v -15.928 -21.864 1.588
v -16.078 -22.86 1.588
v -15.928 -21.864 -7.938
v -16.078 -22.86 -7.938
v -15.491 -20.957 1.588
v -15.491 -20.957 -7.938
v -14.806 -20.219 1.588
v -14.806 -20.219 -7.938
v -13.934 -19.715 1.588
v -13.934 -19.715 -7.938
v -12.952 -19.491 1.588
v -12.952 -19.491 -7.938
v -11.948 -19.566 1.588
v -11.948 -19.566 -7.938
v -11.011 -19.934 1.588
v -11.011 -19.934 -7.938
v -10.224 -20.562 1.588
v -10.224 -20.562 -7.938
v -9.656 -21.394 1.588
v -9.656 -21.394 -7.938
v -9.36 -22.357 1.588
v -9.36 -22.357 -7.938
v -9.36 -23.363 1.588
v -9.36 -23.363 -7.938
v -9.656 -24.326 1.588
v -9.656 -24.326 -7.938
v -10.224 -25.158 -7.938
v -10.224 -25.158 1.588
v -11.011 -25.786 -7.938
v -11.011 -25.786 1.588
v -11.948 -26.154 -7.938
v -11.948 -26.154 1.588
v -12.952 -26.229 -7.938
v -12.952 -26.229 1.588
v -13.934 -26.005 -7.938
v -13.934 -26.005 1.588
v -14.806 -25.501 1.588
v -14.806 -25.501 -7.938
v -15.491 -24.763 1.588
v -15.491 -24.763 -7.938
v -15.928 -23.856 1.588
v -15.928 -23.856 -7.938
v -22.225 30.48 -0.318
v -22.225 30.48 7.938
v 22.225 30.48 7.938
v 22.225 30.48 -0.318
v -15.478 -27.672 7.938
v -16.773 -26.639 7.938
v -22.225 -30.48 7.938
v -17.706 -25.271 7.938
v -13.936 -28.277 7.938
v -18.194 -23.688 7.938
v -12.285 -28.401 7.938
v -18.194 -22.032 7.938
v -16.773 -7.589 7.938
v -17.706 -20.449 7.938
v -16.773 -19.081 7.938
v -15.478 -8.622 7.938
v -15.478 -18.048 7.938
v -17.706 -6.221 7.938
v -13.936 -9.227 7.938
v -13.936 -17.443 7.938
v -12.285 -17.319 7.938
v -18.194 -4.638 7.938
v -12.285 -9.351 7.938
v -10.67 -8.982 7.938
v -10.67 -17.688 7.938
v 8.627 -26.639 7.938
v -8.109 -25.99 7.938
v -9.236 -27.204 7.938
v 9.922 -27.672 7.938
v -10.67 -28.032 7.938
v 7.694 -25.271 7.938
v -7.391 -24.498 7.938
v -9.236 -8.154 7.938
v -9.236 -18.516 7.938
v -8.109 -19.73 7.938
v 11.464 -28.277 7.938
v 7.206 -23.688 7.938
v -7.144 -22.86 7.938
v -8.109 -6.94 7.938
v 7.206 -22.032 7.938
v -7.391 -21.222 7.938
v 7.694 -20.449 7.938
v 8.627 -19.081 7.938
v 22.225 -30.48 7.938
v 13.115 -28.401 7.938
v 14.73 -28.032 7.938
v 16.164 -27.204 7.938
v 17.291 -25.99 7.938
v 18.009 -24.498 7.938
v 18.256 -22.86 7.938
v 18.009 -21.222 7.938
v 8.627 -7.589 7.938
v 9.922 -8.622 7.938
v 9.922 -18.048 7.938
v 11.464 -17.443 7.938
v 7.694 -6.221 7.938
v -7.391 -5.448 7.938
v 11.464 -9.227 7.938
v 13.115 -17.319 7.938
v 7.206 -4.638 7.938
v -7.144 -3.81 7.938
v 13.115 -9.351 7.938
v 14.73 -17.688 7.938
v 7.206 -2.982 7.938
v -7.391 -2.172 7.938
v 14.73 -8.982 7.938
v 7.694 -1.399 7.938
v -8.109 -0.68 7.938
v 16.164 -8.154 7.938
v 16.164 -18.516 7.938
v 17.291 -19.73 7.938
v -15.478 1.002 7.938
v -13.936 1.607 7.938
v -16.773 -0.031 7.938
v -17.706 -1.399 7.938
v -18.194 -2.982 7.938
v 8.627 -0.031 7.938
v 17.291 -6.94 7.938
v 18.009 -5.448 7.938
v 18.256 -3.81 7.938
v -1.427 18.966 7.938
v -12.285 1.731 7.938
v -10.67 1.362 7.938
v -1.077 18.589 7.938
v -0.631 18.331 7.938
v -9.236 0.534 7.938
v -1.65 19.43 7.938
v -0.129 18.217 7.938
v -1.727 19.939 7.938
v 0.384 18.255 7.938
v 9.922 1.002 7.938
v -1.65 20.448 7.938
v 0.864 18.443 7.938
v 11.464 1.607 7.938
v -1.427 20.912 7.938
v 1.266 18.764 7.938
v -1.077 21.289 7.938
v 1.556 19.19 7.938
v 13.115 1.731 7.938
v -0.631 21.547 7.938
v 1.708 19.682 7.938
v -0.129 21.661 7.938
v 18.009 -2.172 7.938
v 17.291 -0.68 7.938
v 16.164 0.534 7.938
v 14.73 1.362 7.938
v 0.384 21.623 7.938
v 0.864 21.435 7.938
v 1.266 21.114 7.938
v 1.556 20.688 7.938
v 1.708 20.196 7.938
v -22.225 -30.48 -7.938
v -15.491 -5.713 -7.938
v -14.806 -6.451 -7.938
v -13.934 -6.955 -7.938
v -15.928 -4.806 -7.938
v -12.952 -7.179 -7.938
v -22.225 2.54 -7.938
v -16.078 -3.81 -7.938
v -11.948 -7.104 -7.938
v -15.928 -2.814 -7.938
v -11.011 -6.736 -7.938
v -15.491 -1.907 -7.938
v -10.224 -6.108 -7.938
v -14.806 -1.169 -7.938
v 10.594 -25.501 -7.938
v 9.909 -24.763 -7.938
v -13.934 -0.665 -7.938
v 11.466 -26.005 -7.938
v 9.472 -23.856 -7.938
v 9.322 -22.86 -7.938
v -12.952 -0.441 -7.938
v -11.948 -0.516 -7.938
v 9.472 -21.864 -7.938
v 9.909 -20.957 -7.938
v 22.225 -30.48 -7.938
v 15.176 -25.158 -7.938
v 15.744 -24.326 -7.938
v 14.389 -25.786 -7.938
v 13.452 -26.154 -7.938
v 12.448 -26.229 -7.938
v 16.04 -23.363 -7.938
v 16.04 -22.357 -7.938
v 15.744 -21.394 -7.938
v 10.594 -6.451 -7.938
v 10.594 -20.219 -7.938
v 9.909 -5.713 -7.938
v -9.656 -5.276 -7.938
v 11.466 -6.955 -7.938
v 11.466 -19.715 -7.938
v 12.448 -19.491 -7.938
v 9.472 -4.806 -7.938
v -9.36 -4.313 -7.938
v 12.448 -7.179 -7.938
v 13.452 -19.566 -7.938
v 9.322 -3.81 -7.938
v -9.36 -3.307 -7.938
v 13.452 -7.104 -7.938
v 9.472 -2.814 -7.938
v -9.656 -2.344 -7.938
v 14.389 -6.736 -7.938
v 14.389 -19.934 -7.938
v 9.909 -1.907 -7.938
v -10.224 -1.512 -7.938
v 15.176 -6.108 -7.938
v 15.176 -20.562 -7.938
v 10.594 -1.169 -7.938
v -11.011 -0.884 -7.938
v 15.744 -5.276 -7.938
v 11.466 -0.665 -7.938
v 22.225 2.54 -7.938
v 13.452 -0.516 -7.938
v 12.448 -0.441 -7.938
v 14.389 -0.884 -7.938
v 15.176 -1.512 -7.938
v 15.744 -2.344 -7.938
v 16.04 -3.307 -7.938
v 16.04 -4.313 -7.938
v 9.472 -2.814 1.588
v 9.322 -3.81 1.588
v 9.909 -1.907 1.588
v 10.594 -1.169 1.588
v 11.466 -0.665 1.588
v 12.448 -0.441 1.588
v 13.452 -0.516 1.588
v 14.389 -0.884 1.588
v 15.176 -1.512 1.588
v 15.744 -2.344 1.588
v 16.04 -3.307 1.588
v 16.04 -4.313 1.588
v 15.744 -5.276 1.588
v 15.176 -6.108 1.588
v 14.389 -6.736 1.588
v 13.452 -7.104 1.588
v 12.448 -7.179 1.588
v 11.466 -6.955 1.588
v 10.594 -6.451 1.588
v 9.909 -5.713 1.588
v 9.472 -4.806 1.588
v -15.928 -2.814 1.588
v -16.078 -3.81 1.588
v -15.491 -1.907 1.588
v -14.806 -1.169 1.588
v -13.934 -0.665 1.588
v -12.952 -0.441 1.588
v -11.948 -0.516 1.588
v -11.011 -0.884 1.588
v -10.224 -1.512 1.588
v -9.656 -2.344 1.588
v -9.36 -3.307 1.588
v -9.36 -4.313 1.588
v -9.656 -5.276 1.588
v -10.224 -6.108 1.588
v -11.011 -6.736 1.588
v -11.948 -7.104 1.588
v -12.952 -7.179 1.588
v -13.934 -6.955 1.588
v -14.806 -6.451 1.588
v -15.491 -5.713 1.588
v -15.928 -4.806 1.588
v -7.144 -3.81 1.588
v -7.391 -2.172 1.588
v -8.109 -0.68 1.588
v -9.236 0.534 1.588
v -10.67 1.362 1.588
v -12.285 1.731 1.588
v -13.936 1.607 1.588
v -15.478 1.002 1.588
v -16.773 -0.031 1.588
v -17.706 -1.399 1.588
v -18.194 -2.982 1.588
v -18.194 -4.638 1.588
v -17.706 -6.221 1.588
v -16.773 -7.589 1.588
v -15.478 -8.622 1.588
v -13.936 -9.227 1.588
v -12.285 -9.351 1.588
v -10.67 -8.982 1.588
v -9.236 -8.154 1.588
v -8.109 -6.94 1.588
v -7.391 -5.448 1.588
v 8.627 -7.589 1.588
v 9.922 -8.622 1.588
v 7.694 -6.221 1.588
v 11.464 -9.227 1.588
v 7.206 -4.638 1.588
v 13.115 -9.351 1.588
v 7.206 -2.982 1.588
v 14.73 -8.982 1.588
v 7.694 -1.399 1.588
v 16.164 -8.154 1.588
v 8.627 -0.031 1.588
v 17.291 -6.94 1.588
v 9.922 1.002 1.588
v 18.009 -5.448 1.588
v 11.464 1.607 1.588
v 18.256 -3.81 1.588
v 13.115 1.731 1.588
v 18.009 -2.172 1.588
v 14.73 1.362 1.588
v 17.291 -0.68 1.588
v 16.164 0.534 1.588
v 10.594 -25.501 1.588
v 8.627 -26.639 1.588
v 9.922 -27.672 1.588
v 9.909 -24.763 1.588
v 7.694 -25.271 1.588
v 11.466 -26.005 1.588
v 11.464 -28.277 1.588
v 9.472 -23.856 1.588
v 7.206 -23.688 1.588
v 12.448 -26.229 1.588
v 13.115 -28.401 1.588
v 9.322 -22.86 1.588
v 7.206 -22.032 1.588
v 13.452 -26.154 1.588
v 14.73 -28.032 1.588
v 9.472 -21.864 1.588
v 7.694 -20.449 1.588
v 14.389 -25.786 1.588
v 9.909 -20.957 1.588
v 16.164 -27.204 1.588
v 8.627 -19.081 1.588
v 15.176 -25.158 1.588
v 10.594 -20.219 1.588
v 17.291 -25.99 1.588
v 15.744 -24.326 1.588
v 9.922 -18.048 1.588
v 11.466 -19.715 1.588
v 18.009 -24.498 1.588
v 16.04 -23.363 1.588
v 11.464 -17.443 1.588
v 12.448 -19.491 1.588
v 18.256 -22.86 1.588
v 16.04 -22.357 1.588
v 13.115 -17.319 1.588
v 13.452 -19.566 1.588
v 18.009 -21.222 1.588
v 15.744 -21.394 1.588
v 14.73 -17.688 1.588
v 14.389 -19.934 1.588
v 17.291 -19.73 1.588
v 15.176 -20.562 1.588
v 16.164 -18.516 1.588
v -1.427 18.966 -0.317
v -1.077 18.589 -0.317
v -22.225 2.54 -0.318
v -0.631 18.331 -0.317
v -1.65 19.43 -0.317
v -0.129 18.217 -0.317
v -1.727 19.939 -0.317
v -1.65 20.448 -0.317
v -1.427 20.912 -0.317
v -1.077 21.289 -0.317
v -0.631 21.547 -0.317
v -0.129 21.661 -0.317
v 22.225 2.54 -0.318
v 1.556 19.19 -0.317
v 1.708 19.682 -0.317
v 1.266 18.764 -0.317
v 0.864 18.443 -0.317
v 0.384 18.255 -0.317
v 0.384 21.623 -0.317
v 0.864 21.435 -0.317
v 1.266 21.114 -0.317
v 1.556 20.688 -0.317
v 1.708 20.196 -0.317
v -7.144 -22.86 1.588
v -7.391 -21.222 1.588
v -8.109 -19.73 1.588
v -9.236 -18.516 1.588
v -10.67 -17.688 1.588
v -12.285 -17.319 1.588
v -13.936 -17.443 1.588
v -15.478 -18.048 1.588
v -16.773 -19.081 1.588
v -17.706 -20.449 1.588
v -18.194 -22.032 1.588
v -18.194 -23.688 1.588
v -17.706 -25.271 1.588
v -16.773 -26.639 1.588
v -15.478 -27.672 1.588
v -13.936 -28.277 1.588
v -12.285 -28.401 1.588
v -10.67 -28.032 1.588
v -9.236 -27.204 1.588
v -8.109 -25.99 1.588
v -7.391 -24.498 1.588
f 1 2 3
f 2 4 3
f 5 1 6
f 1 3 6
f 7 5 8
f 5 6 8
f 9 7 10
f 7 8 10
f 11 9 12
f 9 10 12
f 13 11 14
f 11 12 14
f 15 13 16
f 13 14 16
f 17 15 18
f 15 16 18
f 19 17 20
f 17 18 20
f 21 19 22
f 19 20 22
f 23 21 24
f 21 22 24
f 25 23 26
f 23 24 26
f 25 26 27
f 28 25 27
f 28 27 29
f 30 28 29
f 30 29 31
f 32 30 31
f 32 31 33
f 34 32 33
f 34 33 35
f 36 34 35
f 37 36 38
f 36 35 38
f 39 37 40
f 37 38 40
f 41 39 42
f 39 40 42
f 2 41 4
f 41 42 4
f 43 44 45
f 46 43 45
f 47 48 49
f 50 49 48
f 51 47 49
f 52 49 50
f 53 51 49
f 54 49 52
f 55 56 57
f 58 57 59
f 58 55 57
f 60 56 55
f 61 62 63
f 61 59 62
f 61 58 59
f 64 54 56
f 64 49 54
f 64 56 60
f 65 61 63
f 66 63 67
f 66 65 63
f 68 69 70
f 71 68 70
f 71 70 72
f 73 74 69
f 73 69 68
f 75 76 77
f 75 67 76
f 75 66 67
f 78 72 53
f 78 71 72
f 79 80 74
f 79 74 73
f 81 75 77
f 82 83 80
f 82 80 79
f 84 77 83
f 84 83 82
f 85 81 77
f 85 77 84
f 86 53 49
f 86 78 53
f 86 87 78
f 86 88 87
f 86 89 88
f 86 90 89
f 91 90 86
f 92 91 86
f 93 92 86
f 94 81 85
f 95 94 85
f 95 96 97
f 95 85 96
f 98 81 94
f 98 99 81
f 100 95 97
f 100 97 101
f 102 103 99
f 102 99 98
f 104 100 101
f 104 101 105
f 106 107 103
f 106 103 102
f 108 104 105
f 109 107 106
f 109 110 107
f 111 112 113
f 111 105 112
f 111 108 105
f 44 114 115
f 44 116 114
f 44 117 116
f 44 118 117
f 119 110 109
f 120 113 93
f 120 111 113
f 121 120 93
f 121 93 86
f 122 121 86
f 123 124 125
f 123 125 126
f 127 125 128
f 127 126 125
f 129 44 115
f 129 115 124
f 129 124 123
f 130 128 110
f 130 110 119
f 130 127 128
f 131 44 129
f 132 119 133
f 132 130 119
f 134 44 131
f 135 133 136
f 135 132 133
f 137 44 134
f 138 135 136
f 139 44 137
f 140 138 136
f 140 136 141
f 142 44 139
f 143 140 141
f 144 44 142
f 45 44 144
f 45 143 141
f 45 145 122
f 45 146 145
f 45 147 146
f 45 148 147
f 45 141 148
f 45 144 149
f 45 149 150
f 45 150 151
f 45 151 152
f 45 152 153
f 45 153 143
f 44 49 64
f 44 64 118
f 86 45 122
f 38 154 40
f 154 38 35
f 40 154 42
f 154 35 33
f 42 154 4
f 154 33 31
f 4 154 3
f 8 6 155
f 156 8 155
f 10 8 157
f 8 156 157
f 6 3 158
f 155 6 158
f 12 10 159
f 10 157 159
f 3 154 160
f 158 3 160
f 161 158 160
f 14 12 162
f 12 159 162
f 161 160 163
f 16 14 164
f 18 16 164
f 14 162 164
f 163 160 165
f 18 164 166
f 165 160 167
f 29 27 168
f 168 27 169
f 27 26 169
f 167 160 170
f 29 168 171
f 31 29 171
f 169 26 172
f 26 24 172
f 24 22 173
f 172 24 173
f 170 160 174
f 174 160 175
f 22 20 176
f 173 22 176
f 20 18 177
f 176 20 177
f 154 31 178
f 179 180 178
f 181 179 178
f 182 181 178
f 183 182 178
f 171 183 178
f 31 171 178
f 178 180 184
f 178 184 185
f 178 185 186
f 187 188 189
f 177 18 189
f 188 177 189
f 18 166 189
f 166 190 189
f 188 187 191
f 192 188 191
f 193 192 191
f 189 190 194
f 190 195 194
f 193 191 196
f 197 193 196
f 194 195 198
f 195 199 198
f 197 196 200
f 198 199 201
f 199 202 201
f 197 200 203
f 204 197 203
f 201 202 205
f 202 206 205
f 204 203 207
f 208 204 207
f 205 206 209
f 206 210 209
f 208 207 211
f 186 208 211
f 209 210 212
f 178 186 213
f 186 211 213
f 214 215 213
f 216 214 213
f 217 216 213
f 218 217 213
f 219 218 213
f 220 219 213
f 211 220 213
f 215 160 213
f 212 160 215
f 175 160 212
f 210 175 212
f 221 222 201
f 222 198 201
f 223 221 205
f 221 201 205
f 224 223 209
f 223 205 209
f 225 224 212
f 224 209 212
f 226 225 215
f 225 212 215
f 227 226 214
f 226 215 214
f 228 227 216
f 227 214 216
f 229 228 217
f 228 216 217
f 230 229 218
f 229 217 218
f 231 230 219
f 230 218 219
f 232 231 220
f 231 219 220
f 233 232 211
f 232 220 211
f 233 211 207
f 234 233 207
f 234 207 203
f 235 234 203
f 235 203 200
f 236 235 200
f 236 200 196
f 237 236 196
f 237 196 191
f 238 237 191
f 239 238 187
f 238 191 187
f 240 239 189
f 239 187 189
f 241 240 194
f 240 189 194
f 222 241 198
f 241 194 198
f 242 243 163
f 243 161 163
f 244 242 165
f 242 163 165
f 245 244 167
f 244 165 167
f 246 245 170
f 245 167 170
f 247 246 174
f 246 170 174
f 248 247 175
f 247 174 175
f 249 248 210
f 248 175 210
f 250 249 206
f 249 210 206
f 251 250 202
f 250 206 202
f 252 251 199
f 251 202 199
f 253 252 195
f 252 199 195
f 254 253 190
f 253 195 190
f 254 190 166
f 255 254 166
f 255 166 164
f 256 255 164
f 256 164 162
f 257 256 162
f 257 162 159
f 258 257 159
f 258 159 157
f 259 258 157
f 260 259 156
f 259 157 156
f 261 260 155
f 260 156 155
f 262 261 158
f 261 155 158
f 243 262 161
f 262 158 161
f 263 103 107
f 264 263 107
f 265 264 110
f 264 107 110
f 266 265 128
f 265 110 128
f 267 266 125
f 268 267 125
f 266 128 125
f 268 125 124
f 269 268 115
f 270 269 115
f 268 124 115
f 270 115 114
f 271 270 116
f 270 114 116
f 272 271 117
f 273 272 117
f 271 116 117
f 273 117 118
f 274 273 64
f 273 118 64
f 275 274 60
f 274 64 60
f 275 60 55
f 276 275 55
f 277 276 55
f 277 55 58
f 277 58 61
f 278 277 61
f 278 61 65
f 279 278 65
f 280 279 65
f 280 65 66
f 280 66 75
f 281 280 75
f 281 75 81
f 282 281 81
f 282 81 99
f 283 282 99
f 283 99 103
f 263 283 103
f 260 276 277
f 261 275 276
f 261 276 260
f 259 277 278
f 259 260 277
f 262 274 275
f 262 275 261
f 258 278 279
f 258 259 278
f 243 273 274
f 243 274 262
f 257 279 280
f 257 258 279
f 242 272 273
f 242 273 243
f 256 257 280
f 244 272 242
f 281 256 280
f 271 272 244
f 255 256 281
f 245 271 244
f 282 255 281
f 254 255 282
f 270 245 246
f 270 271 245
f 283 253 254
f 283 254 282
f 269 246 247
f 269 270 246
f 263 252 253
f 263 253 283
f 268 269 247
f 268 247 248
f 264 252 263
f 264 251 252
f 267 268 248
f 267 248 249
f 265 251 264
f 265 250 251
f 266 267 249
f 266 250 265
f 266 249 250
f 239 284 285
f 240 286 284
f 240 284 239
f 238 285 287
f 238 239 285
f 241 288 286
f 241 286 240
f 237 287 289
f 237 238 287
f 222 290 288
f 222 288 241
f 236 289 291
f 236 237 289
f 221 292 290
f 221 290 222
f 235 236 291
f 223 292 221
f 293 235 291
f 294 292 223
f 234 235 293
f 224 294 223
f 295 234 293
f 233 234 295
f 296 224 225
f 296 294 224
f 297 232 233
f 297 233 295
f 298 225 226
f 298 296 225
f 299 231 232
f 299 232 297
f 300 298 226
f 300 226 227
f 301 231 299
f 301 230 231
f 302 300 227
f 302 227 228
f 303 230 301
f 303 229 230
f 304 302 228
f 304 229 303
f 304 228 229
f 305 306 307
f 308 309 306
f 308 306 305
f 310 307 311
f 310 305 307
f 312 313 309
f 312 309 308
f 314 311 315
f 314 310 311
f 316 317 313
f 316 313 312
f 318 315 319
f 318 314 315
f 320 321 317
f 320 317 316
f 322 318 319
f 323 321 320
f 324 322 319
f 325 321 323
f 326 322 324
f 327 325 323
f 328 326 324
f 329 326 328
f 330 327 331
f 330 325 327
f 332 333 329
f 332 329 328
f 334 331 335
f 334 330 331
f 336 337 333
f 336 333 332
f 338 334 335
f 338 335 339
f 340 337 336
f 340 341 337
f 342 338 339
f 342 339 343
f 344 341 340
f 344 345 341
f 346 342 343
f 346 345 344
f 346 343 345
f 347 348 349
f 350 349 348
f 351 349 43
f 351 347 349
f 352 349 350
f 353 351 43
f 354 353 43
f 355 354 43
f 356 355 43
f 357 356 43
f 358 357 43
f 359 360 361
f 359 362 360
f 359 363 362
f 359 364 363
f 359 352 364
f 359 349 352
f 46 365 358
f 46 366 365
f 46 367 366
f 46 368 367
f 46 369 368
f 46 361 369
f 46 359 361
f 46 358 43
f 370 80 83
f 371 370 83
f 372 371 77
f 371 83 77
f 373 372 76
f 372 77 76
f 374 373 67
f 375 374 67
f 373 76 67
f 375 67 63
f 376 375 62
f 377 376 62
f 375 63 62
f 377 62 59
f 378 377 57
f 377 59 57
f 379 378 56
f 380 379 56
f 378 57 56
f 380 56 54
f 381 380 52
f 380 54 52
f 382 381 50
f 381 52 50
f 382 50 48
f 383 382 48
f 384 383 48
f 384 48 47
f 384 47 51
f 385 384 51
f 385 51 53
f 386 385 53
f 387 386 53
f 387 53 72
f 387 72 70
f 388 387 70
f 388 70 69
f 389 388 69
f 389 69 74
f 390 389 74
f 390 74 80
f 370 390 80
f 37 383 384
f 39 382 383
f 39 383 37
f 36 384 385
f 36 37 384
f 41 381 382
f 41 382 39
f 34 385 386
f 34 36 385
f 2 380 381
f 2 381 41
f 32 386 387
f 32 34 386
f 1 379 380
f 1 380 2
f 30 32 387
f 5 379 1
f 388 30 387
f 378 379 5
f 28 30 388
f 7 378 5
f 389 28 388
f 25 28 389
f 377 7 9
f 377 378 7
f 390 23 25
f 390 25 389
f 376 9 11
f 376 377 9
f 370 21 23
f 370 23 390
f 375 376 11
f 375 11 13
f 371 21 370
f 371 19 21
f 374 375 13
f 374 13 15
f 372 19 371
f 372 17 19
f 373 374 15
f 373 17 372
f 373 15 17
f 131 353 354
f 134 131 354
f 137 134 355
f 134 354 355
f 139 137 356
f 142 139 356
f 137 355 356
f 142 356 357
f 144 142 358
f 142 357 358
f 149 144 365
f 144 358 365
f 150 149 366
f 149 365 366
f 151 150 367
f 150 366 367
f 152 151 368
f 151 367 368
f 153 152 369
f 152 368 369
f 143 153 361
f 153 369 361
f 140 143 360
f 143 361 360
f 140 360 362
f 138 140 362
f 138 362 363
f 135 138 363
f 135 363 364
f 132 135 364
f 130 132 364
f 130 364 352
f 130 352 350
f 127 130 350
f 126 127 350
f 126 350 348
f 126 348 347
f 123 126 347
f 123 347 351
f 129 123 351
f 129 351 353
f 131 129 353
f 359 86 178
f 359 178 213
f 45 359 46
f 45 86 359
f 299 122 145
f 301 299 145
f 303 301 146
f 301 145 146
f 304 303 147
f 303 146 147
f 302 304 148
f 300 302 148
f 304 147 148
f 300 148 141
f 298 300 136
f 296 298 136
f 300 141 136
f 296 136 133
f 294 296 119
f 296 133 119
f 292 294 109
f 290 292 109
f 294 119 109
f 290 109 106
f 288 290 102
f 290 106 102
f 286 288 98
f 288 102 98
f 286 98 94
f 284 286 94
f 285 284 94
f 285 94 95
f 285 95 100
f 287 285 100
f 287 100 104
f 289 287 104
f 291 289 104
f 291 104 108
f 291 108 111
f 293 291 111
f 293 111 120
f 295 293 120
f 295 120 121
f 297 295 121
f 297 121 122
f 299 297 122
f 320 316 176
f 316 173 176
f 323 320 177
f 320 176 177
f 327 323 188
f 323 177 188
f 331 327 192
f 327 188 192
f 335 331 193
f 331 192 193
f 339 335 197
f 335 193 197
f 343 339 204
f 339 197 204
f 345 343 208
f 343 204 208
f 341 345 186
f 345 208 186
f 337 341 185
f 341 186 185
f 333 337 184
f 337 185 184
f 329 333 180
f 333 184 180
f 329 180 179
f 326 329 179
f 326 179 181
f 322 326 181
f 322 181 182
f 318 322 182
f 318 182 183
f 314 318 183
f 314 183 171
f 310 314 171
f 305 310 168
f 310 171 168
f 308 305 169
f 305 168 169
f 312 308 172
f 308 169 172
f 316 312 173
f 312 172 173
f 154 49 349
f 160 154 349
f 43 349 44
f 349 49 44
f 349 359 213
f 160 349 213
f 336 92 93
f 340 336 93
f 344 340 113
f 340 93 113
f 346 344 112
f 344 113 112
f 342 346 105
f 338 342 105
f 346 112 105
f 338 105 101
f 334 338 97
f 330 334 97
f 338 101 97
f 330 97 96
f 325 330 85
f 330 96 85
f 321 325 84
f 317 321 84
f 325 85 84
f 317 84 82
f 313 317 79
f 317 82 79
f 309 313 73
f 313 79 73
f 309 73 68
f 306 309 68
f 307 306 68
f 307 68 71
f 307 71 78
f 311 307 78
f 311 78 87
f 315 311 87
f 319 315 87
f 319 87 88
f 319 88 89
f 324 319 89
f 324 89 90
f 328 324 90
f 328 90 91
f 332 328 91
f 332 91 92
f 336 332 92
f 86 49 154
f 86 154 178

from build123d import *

# Parameters (mm, degrees)
SKETCH1_W                                        = 44.45
SKETCH1_H                                        = 60.96
BOSS_EXTRUDE1_DEPTH                              = 7.9375
CBORE_FOR_1_4_SOCKET_HEAD_CAP_SCREW1_D           = 6.7564
CBORE_FOR_1_4_SOCKET_HEAD_CAP_SCREW1_CBORE_D     = 11.1125
CBORE_FOR_1_4_SOCKET_HEAD_CAP_SCREW1_CBORE_DEPTH = 6.35
SKETCH4_W                                        = 7.62
SKETCH4_H                                        = 27.94
CUT_EXTRUDE1_DEPTH                               = 45.45
F_8_32_TAPPED_HOLE1_D                            = 3.4544


with BuildPart() as part:
    # Sketch1 → Boss-Extrude1 (new body, symmetric)
    with BuildSketch(Plane.XY):
        Rectangle(SKETCH1_W, SKETCH1_H)
    extrude(amount=BOSS_EXTRUDE1_DEPTH, both=True)

    # CBORE for 1/4 Socket Head Cap Screw1 (through all)
    with Locations(Plane.XY.offset(7.9375)):
        with Locations((-12.7, -3.81), (12.7, -3.81), (12.7, -22.86), (-12.7, -22.86)):
            CounterBoreHole(CBORE_FOR_1_4_SOCKET_HEAD_CAP_SCREW1_D / 2, CBORE_FOR_1_4_SOCKET_HEAD_CAP_SCREW1_CBORE_D / 2, CBORE_FOR_1_4_SOCKET_HEAD_CAP_SCREW1_CBORE_DEPTH)

    # Sketch4 → Cut-Extrude1 (cut, through all)
    with BuildSketch(Plane(origin=(22.225, 0, 0), x_dir=(0, 0, -1), z_dir=(1, 0, 0))):
        with Locations((4.1275, 16.51)):
            Rectangle(SKETCH4_W, SKETCH4_H)
    extrude(amount=-CUT_EXTRUDE1_DEPTH, mode=Mode.SUBTRACT)

    # #8-32 Tapped Hole1 (through all)
    with Locations(Plane.XY.offset(7.9375)):
        with Locations((0, 19.939)):
            Hole(F_8_32_TAPPED_HOLE1_D / 2)


solid = part.part
